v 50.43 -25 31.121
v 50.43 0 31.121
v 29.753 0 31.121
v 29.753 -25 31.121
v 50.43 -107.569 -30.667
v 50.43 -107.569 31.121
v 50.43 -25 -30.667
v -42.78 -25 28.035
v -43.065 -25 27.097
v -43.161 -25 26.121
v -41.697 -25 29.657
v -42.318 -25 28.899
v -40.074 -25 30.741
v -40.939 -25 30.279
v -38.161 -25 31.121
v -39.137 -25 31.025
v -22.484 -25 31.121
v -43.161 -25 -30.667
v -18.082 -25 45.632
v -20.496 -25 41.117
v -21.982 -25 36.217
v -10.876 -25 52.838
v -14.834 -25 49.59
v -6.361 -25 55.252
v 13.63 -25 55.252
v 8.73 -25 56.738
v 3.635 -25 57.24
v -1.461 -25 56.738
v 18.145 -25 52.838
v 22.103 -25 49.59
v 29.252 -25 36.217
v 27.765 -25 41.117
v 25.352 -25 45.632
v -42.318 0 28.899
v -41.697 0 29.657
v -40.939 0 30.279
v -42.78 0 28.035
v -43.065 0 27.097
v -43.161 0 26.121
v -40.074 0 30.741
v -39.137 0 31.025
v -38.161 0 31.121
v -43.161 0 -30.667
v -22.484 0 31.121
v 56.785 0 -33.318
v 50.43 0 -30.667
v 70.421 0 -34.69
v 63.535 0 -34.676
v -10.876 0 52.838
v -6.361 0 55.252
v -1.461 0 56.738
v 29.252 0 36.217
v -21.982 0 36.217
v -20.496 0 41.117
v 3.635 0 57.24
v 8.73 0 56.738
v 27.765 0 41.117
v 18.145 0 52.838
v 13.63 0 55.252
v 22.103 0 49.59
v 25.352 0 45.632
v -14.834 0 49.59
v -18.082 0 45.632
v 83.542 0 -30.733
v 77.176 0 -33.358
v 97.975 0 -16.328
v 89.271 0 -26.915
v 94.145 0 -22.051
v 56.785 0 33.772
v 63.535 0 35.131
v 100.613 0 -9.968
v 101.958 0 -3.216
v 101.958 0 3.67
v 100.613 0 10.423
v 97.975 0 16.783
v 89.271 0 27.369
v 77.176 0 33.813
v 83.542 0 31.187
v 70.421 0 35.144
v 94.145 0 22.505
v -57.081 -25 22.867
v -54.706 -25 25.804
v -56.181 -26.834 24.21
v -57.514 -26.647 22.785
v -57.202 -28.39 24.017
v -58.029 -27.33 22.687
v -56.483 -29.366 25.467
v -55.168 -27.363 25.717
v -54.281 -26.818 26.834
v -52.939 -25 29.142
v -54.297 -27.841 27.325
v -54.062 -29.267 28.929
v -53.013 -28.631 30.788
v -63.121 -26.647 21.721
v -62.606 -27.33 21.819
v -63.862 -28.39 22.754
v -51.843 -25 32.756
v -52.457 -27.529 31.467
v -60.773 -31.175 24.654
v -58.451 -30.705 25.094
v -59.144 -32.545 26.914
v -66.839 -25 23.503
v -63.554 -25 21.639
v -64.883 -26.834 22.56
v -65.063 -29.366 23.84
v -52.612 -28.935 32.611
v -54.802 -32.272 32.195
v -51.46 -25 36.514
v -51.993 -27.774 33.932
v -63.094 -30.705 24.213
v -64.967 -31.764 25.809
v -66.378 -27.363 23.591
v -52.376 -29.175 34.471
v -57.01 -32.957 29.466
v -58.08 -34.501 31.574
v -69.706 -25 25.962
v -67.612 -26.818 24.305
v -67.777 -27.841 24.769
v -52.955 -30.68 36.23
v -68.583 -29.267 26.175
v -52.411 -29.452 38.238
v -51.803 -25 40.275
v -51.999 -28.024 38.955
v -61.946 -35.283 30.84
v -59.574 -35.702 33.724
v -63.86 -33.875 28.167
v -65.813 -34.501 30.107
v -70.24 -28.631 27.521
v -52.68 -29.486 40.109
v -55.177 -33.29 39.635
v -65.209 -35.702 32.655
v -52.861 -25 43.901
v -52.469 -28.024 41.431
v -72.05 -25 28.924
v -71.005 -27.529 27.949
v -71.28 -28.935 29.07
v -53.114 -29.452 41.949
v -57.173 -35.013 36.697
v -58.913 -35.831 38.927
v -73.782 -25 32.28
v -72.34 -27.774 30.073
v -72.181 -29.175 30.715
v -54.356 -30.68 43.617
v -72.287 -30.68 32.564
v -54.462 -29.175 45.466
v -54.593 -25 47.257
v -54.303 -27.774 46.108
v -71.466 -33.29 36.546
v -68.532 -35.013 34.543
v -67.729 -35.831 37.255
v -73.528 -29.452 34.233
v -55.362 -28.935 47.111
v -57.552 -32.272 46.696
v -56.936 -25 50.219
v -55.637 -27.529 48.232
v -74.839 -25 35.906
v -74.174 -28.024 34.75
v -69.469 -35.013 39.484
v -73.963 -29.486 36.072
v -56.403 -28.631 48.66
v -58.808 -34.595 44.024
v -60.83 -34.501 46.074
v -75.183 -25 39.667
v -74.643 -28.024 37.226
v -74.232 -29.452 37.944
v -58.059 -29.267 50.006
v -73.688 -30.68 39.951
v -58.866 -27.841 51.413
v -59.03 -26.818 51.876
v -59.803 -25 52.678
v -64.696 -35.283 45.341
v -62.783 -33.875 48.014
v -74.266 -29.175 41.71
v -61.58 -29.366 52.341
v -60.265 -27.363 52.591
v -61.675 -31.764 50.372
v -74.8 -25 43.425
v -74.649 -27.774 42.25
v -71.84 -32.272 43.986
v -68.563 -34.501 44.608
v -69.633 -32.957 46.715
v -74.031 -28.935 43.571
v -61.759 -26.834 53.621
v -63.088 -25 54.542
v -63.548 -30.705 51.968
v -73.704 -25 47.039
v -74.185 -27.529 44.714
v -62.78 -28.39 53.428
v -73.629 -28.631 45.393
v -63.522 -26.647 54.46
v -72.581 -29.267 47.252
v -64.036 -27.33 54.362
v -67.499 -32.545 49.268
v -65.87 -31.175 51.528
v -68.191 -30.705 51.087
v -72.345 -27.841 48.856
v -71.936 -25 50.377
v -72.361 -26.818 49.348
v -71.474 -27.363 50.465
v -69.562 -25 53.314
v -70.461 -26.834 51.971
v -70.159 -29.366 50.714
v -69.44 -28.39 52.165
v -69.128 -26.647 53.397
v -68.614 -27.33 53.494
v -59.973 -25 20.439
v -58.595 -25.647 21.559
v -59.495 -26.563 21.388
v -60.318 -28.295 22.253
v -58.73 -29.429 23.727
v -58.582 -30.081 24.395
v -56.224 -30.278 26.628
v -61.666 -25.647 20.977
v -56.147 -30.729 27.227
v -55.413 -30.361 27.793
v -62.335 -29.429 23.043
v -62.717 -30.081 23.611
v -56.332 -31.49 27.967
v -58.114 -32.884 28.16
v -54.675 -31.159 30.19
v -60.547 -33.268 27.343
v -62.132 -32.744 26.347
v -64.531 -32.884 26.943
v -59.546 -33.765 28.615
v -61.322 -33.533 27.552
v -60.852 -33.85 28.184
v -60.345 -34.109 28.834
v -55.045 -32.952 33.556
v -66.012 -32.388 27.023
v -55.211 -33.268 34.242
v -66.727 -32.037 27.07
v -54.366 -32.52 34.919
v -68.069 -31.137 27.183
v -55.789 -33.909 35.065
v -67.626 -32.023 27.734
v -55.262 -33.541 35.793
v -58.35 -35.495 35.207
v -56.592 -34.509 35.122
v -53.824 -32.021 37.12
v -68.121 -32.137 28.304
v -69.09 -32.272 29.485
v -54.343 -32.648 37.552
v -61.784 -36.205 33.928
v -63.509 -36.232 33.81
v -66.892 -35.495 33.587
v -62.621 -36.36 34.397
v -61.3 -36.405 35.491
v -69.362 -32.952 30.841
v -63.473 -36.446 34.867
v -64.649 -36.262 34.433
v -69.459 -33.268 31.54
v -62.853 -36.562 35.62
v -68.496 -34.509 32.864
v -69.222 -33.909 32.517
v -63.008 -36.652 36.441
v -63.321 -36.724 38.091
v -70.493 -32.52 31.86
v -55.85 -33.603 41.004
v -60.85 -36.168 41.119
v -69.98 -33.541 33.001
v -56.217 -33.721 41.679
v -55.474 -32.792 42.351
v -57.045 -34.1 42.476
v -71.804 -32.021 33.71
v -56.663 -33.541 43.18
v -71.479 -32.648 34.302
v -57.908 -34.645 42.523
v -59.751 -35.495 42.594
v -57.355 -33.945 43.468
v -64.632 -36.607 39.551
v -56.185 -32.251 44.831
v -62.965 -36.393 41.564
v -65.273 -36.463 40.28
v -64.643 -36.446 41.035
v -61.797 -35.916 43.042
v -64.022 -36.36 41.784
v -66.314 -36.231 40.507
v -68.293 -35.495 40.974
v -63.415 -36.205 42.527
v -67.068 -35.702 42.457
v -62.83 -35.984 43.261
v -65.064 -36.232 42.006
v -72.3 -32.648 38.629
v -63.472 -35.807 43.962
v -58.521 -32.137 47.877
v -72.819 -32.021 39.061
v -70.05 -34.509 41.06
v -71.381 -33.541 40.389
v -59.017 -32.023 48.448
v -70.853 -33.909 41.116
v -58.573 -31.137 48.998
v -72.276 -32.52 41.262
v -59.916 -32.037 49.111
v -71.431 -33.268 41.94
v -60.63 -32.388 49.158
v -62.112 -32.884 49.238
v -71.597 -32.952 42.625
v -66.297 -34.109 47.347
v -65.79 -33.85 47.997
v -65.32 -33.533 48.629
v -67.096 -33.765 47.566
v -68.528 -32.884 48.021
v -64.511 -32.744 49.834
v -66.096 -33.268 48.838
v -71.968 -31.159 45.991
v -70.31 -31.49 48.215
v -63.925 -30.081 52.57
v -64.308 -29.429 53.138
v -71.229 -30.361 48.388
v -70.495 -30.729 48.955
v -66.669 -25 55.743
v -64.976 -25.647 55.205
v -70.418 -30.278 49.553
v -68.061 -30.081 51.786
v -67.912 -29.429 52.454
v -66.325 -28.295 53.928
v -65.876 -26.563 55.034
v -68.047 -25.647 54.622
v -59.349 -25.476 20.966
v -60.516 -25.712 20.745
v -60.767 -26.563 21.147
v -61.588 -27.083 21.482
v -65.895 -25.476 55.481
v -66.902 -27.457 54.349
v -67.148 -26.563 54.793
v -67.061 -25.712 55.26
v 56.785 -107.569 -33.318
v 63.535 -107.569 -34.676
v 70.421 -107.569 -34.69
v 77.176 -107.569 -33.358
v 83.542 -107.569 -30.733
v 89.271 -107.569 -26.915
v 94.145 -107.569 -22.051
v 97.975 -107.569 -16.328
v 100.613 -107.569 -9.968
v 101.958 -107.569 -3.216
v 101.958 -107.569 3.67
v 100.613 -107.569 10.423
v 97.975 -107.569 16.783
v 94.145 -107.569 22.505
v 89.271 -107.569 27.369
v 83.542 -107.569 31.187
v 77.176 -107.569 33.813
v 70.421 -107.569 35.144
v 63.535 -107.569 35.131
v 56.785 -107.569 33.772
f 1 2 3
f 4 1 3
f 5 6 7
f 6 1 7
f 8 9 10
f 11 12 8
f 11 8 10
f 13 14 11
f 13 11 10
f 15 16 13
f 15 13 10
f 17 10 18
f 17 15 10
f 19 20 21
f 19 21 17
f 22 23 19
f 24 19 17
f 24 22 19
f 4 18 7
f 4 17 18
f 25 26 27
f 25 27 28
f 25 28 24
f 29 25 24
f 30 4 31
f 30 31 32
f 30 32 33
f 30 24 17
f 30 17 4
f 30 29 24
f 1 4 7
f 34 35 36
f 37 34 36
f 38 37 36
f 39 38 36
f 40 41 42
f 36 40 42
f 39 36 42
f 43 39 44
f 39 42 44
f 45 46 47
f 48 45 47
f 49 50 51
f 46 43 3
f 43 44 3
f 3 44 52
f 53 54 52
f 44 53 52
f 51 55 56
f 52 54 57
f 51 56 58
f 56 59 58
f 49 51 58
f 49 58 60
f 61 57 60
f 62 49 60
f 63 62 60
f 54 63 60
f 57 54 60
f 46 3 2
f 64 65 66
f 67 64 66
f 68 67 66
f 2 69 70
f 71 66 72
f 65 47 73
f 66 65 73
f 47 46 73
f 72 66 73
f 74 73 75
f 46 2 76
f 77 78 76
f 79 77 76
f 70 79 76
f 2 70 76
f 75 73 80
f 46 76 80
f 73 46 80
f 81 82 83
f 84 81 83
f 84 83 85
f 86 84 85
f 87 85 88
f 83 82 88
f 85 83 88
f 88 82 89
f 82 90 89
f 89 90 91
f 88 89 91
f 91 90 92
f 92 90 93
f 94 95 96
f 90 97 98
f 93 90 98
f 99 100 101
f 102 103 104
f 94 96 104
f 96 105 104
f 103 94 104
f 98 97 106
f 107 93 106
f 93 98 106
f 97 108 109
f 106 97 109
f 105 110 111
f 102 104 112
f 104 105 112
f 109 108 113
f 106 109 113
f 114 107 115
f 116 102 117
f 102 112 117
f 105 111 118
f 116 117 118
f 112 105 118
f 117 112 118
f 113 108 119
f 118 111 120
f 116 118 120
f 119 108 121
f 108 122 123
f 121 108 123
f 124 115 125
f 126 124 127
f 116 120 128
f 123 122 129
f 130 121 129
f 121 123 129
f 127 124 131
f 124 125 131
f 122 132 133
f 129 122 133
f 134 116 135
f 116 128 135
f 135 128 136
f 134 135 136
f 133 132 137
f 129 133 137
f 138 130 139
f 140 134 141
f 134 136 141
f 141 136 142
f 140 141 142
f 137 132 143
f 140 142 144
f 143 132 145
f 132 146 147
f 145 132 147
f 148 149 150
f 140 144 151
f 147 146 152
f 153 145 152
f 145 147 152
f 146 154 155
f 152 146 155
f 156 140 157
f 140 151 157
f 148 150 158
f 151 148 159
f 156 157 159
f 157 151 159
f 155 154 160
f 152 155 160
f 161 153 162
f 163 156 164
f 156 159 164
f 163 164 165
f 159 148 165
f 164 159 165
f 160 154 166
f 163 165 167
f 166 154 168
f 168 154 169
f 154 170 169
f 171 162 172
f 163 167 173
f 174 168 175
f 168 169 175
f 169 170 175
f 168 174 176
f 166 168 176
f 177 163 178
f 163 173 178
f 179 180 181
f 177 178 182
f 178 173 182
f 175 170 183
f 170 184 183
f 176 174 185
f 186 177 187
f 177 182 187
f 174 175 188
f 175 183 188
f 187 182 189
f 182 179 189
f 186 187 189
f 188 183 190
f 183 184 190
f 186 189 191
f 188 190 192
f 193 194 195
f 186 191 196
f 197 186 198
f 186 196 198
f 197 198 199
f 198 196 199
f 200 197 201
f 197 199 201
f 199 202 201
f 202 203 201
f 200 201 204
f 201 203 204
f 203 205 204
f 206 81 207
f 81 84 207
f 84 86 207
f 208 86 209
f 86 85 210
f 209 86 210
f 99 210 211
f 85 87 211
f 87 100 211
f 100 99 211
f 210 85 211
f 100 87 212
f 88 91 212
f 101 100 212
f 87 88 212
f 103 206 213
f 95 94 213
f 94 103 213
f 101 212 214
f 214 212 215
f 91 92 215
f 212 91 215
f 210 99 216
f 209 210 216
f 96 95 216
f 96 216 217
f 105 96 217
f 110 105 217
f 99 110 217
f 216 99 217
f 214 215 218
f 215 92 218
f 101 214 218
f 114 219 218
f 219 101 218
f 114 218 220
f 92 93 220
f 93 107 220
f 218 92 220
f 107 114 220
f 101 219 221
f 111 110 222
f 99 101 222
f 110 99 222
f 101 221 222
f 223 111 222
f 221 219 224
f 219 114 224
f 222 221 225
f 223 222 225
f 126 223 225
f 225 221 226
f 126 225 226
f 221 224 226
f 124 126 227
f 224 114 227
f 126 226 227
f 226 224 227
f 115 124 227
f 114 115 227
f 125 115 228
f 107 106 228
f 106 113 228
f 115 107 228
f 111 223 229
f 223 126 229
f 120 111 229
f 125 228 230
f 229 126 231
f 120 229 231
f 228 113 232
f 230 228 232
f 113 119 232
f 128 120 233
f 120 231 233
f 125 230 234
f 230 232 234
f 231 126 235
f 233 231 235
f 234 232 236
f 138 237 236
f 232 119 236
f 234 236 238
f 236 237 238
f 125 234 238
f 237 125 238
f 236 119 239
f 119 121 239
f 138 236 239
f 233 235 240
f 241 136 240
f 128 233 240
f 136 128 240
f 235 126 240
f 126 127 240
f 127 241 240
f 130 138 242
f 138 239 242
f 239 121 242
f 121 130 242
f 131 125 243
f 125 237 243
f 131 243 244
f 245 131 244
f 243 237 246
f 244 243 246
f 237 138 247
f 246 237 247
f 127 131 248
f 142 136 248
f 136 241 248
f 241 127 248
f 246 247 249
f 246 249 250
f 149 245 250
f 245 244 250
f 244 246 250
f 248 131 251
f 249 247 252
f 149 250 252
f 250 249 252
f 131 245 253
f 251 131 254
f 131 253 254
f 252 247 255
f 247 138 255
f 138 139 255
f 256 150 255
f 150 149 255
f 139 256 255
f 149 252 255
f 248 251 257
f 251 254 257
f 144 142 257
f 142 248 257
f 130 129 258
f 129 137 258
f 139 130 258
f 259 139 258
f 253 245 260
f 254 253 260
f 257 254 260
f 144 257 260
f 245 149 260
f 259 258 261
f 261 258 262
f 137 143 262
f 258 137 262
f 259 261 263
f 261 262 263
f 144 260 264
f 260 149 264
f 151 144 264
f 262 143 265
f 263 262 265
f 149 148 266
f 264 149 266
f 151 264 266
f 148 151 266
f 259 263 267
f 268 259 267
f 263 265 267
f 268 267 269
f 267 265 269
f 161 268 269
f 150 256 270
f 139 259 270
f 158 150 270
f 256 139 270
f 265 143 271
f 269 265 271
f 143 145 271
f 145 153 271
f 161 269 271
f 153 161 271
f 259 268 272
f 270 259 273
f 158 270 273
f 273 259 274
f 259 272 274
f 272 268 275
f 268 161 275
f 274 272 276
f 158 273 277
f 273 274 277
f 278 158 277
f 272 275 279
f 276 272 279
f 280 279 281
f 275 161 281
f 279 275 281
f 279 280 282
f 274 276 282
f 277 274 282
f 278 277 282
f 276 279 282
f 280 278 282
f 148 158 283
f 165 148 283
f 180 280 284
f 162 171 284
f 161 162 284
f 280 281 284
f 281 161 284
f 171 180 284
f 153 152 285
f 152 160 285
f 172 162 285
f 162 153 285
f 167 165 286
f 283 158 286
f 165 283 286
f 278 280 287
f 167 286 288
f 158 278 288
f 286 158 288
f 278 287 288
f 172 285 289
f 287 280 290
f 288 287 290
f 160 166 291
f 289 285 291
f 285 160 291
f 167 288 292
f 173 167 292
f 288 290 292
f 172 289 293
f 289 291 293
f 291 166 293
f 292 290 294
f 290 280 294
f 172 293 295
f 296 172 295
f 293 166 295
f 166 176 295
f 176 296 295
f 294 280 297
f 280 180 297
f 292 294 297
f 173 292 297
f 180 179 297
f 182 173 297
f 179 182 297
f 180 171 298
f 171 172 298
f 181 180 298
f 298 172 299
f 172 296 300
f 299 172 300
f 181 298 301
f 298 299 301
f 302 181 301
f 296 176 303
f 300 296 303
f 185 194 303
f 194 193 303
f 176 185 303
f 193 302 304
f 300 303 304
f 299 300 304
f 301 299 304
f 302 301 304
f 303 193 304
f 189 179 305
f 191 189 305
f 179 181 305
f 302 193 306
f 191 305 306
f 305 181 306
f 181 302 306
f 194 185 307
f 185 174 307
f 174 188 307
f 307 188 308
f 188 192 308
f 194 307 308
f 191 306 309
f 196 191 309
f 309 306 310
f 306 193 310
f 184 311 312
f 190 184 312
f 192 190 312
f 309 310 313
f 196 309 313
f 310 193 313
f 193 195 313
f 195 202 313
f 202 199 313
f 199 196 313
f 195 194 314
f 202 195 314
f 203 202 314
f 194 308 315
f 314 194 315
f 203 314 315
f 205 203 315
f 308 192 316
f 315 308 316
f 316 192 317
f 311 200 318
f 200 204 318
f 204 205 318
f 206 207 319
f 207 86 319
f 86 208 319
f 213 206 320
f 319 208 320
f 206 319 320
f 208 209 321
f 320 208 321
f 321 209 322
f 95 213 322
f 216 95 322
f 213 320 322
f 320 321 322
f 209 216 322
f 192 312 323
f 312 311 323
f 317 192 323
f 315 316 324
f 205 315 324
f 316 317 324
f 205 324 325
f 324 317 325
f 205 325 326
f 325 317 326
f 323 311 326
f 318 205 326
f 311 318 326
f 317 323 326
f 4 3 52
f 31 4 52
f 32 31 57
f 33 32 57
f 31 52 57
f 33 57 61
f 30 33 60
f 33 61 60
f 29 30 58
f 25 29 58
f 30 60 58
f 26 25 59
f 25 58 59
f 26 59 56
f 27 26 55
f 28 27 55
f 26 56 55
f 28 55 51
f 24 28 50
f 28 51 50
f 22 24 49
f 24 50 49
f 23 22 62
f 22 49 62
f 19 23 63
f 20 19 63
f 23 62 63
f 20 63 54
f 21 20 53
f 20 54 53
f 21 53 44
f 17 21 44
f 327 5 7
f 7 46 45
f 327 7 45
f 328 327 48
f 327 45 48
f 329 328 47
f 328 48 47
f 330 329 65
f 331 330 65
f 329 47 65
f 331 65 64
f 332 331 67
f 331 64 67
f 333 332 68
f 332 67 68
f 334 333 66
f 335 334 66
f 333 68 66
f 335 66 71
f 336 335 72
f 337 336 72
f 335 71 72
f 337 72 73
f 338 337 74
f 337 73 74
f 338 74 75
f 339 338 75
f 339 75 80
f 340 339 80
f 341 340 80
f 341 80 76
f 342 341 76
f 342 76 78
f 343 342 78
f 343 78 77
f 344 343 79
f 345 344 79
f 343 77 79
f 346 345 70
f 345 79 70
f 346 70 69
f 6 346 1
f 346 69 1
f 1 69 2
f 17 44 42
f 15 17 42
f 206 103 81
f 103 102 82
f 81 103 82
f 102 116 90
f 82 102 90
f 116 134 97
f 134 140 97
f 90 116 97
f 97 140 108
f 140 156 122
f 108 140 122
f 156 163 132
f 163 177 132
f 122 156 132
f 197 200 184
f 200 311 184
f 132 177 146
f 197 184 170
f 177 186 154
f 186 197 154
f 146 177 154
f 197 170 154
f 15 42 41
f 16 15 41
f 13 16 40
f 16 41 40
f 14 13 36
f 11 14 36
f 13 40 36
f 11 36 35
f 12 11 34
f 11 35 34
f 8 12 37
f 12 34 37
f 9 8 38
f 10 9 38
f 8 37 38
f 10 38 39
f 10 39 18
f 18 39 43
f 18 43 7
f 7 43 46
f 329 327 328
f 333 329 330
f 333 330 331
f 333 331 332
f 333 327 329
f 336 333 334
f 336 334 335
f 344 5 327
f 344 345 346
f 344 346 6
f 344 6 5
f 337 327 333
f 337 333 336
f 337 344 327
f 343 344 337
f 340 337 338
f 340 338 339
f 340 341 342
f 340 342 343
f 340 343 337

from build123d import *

# Parameters (mm, degrees)
F1_DEPTH = 25
F2_DEPTH = 67.56943
F3_DEPTH = 40
F5_ANGLE = 180


with BuildPart() as f1:
    # F0 (on Front) → F1 (new body)
    with BuildSketch(Plane.XZ):
        with BuildLine():
            Line((-22.4842395432, 31.121391803), (-38.1610532105, 31.121391803))
            ThreePointArc((-38.1610532105, 31.121391803), (-41.6965871164, 29.656925709), (-43.1610532105, 26.121391803))
            Line((-43.1610532105, 26.121391803), (-43.1610532105, -30.6670609862))
            Line((-43.1610532105, -30.6670609862), (50.4302829504, -30.6670609862))
            Line((50.4302829504, -30.6670609862), (50.4302829504, 31.121391803))
            Line((50.4302829504, 31.121391803), (29.7534692831, 31.121391803))
            ThreePointArc((29.7534692831, 31.121391803), (3.63461487, 57.2402462162), (-22.4842395432, 31.121391803))
        make_face()
    extrude(amount=F1_DEPTH)

    # F0 (on Front) → F2 (join)
    with BuildSketch(Plane.XZ):
        with BuildLine():
            ThreePointArc((50.4302829504, -30.6670609862), (102.1270157048, 0.2271654084), (50.4302829504, 31.121391803))
            Line((50.4302829504, 31.121391803), (50.4302829504, -30.6670609862))
        make_face()
    extrude(amount=F2_DEPTH)

    # F3 (add): a face of the model
    f3_faces = [f1.faces().sort_by_distance(p)[0] for p in [
        (73.4849703937, -67.56943, 0.2271654084),
    ]]
    extrude(f3_faces, amount=F3_DEPTH)


with BuildPart() as f5:
    # F4 (on face) → F5 (revolve)
    with BuildSketch(Plane.XZ.offset(25)):
        with BuildLine():
            Line((-66.6690021753, 55.7426698506), (-59.9734187126, 20.4386897385))
            ThreePointArc((-59.9734187126, 20.4386897385), (-51.8030270405, 40.2751631891), (-66.6690021753, 55.7426698506))
        make_face()
    revolve(axis=Axis((-63.321210444, -25, 38.0906797945), (0.1863336788, 0, -0.9824865191)), revolution_arc=F5_ANGLE)


solid = Compound([f1.part, f5.part])
